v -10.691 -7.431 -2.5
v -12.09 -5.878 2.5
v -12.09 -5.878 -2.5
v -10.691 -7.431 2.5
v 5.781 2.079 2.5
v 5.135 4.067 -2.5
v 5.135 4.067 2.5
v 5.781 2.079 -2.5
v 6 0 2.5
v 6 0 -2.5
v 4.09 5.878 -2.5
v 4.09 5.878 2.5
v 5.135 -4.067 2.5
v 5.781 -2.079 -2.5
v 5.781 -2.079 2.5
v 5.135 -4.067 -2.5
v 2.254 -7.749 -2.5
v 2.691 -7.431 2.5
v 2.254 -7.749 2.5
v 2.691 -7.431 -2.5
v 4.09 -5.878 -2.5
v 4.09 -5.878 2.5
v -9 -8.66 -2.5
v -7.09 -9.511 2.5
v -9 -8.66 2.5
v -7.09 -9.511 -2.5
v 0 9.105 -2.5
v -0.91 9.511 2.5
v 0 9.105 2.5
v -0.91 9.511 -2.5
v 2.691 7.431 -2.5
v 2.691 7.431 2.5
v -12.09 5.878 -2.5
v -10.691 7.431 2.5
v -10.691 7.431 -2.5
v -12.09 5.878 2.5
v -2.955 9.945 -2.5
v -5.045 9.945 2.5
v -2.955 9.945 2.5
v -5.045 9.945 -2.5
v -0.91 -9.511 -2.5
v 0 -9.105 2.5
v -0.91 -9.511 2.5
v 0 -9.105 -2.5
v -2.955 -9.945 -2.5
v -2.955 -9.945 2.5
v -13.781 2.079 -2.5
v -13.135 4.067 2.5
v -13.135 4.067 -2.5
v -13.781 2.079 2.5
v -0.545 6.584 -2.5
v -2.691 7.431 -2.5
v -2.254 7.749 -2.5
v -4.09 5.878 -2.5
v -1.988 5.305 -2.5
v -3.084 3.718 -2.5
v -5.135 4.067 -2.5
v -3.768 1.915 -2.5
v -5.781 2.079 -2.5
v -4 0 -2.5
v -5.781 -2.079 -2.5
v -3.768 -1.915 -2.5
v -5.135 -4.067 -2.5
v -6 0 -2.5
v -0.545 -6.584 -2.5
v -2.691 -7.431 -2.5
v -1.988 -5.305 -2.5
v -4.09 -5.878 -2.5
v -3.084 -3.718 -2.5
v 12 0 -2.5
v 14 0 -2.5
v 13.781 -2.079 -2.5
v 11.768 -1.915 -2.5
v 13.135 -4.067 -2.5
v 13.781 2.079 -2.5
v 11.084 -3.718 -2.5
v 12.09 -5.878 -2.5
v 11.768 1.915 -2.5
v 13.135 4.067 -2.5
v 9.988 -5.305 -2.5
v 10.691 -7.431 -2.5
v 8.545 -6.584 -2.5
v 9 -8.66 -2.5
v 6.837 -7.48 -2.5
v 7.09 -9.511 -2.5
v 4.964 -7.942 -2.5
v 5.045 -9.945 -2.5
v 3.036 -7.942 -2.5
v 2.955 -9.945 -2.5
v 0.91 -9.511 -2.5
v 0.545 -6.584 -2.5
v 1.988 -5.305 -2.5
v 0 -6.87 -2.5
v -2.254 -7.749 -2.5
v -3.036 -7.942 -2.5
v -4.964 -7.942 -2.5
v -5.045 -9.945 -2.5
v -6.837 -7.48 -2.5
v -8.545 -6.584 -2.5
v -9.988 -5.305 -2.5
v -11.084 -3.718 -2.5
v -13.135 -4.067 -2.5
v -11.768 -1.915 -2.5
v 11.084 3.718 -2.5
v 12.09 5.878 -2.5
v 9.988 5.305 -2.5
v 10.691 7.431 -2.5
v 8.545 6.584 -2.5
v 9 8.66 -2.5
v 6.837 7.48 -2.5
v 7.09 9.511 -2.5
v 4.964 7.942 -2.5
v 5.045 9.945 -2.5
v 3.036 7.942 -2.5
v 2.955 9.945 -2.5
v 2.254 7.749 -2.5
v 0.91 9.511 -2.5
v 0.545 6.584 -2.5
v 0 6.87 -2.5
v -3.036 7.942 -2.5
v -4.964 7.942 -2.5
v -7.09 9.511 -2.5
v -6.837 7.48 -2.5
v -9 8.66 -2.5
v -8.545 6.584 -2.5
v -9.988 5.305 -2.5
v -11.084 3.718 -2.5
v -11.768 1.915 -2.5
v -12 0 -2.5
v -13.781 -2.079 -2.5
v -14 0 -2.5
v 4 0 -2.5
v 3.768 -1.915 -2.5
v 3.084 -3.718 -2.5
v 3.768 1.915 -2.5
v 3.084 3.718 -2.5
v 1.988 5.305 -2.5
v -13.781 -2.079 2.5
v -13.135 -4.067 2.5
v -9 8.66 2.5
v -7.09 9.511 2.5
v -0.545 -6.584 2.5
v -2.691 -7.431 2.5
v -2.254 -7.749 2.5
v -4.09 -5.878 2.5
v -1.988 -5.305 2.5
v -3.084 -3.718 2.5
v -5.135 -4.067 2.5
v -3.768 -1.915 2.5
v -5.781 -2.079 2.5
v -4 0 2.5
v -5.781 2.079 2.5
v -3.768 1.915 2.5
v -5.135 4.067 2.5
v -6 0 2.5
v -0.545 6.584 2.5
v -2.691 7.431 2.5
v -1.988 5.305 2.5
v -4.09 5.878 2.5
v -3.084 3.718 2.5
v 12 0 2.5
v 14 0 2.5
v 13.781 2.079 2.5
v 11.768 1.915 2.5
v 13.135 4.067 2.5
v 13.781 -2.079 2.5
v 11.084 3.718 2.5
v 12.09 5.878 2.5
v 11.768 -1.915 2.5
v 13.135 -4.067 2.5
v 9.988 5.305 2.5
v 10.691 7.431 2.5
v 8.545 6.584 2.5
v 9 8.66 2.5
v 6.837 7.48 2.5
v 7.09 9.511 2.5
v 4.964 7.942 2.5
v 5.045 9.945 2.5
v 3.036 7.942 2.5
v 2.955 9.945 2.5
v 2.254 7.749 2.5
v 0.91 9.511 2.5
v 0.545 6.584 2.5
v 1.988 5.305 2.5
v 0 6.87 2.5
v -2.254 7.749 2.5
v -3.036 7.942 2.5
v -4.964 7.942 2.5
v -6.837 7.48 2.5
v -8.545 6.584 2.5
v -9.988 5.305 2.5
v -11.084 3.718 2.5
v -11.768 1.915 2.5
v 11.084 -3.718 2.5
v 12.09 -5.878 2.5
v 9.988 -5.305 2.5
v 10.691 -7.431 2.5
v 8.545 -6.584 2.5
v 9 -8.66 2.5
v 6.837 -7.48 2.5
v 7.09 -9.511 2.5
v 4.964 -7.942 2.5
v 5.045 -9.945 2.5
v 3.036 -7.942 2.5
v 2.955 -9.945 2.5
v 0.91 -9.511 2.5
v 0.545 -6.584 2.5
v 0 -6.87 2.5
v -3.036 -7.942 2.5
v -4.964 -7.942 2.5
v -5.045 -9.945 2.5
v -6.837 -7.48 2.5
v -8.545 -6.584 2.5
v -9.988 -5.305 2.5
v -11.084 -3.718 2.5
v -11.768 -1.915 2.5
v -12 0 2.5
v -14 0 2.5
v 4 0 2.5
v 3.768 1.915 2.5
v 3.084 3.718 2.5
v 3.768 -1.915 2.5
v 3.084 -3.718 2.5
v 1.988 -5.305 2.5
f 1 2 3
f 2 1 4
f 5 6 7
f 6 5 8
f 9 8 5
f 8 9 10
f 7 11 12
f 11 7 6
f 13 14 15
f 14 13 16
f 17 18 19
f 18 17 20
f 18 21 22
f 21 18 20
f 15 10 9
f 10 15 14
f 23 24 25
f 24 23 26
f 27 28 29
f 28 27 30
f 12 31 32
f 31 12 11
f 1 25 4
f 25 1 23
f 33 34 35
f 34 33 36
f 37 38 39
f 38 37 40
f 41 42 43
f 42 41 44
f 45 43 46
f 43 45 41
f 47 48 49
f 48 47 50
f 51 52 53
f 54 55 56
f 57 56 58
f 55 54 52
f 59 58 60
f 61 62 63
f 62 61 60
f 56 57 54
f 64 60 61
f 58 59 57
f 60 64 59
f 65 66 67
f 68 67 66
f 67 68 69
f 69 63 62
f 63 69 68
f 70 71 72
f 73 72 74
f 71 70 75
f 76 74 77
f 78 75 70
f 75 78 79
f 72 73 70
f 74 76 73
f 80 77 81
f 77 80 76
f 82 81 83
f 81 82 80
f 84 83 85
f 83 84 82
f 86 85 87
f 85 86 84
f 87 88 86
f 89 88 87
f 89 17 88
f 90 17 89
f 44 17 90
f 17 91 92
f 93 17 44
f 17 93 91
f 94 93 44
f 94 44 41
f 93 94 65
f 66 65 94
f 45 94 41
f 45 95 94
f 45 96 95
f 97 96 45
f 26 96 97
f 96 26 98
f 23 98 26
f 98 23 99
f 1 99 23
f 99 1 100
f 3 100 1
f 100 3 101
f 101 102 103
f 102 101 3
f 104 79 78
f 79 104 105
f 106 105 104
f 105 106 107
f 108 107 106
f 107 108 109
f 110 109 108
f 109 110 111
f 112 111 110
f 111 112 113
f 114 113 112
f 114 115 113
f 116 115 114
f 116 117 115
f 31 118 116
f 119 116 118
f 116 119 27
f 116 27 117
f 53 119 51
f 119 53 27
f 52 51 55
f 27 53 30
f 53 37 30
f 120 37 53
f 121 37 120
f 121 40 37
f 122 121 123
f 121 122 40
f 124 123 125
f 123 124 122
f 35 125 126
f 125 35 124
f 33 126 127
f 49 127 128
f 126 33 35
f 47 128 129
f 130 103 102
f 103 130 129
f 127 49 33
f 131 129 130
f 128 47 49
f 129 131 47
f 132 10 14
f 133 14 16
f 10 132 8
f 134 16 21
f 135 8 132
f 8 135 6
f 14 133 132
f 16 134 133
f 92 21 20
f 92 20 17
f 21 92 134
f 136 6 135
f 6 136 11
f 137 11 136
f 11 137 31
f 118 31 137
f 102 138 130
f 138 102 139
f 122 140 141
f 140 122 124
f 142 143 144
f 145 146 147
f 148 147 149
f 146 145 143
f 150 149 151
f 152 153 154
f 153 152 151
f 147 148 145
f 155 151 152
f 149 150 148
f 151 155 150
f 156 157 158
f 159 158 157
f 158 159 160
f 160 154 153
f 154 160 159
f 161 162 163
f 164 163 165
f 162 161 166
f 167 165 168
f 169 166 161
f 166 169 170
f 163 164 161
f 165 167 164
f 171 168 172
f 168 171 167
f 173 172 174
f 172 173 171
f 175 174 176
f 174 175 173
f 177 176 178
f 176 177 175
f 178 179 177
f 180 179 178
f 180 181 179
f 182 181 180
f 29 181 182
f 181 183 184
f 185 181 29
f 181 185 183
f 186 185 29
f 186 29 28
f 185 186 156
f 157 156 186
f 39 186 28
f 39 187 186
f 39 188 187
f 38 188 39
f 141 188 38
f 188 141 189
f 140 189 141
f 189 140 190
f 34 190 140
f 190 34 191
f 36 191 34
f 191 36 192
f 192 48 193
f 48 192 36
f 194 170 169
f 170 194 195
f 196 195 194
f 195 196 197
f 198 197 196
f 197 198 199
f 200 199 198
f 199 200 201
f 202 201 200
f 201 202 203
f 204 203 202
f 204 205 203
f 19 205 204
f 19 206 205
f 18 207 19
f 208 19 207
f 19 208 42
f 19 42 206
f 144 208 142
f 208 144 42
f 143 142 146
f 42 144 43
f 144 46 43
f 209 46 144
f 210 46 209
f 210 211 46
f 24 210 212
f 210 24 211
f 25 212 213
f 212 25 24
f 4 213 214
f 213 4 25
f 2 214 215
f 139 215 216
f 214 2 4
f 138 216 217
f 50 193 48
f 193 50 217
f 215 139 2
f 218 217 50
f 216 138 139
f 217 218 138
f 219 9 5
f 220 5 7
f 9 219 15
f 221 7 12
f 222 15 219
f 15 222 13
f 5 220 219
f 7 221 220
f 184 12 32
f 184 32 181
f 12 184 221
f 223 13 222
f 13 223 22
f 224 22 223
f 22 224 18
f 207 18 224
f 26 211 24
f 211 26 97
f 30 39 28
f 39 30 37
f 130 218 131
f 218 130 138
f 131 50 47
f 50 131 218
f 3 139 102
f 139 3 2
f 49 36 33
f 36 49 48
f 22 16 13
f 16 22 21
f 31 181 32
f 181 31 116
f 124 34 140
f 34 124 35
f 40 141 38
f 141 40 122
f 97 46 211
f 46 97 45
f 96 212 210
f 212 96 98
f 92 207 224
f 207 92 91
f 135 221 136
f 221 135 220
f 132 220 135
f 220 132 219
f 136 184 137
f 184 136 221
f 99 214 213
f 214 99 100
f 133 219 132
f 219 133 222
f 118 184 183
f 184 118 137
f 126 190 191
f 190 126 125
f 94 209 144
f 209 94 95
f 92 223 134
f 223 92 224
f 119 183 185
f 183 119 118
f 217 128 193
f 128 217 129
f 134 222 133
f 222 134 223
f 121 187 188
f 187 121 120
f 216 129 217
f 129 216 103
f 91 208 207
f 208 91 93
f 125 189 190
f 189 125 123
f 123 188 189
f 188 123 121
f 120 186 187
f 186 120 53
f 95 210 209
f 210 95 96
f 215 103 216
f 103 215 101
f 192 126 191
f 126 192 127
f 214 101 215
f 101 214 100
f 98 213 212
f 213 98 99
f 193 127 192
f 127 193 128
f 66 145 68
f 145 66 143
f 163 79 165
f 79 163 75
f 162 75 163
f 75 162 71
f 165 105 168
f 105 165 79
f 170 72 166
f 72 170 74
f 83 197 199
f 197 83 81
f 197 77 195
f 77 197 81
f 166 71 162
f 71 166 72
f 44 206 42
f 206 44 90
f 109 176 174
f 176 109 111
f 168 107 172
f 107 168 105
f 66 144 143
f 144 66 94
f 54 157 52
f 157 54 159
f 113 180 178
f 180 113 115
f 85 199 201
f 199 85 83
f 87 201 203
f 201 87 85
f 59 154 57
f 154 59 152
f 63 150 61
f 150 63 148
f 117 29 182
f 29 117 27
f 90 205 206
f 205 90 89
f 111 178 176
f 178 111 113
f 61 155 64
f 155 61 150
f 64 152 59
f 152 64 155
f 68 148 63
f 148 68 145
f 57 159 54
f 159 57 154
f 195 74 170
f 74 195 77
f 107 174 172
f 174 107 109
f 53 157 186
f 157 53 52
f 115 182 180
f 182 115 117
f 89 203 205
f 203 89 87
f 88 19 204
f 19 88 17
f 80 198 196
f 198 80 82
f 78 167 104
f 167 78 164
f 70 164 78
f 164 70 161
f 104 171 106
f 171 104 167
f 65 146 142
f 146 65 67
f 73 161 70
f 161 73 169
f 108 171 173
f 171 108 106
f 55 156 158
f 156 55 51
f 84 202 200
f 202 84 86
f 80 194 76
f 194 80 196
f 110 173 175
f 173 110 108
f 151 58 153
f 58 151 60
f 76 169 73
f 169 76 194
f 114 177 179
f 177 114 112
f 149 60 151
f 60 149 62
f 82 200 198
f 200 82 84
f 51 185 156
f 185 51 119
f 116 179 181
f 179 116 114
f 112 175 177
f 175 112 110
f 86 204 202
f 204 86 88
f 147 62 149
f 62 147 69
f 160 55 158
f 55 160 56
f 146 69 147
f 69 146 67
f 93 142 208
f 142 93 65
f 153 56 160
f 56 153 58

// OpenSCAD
translate(v=[-4, 0, 0]) {
    difference() {
        cylinder(r=10, h=5, center=true);
        cylinder(r=8, h=5, center=true);
    };
};

translate(v=[4, 0, 0]) {
    render() {
        difference() {
            cylinder(r=10, h=5, center=true);
            cylinder(r=8, h=5, center=true);
        };
    };
};
